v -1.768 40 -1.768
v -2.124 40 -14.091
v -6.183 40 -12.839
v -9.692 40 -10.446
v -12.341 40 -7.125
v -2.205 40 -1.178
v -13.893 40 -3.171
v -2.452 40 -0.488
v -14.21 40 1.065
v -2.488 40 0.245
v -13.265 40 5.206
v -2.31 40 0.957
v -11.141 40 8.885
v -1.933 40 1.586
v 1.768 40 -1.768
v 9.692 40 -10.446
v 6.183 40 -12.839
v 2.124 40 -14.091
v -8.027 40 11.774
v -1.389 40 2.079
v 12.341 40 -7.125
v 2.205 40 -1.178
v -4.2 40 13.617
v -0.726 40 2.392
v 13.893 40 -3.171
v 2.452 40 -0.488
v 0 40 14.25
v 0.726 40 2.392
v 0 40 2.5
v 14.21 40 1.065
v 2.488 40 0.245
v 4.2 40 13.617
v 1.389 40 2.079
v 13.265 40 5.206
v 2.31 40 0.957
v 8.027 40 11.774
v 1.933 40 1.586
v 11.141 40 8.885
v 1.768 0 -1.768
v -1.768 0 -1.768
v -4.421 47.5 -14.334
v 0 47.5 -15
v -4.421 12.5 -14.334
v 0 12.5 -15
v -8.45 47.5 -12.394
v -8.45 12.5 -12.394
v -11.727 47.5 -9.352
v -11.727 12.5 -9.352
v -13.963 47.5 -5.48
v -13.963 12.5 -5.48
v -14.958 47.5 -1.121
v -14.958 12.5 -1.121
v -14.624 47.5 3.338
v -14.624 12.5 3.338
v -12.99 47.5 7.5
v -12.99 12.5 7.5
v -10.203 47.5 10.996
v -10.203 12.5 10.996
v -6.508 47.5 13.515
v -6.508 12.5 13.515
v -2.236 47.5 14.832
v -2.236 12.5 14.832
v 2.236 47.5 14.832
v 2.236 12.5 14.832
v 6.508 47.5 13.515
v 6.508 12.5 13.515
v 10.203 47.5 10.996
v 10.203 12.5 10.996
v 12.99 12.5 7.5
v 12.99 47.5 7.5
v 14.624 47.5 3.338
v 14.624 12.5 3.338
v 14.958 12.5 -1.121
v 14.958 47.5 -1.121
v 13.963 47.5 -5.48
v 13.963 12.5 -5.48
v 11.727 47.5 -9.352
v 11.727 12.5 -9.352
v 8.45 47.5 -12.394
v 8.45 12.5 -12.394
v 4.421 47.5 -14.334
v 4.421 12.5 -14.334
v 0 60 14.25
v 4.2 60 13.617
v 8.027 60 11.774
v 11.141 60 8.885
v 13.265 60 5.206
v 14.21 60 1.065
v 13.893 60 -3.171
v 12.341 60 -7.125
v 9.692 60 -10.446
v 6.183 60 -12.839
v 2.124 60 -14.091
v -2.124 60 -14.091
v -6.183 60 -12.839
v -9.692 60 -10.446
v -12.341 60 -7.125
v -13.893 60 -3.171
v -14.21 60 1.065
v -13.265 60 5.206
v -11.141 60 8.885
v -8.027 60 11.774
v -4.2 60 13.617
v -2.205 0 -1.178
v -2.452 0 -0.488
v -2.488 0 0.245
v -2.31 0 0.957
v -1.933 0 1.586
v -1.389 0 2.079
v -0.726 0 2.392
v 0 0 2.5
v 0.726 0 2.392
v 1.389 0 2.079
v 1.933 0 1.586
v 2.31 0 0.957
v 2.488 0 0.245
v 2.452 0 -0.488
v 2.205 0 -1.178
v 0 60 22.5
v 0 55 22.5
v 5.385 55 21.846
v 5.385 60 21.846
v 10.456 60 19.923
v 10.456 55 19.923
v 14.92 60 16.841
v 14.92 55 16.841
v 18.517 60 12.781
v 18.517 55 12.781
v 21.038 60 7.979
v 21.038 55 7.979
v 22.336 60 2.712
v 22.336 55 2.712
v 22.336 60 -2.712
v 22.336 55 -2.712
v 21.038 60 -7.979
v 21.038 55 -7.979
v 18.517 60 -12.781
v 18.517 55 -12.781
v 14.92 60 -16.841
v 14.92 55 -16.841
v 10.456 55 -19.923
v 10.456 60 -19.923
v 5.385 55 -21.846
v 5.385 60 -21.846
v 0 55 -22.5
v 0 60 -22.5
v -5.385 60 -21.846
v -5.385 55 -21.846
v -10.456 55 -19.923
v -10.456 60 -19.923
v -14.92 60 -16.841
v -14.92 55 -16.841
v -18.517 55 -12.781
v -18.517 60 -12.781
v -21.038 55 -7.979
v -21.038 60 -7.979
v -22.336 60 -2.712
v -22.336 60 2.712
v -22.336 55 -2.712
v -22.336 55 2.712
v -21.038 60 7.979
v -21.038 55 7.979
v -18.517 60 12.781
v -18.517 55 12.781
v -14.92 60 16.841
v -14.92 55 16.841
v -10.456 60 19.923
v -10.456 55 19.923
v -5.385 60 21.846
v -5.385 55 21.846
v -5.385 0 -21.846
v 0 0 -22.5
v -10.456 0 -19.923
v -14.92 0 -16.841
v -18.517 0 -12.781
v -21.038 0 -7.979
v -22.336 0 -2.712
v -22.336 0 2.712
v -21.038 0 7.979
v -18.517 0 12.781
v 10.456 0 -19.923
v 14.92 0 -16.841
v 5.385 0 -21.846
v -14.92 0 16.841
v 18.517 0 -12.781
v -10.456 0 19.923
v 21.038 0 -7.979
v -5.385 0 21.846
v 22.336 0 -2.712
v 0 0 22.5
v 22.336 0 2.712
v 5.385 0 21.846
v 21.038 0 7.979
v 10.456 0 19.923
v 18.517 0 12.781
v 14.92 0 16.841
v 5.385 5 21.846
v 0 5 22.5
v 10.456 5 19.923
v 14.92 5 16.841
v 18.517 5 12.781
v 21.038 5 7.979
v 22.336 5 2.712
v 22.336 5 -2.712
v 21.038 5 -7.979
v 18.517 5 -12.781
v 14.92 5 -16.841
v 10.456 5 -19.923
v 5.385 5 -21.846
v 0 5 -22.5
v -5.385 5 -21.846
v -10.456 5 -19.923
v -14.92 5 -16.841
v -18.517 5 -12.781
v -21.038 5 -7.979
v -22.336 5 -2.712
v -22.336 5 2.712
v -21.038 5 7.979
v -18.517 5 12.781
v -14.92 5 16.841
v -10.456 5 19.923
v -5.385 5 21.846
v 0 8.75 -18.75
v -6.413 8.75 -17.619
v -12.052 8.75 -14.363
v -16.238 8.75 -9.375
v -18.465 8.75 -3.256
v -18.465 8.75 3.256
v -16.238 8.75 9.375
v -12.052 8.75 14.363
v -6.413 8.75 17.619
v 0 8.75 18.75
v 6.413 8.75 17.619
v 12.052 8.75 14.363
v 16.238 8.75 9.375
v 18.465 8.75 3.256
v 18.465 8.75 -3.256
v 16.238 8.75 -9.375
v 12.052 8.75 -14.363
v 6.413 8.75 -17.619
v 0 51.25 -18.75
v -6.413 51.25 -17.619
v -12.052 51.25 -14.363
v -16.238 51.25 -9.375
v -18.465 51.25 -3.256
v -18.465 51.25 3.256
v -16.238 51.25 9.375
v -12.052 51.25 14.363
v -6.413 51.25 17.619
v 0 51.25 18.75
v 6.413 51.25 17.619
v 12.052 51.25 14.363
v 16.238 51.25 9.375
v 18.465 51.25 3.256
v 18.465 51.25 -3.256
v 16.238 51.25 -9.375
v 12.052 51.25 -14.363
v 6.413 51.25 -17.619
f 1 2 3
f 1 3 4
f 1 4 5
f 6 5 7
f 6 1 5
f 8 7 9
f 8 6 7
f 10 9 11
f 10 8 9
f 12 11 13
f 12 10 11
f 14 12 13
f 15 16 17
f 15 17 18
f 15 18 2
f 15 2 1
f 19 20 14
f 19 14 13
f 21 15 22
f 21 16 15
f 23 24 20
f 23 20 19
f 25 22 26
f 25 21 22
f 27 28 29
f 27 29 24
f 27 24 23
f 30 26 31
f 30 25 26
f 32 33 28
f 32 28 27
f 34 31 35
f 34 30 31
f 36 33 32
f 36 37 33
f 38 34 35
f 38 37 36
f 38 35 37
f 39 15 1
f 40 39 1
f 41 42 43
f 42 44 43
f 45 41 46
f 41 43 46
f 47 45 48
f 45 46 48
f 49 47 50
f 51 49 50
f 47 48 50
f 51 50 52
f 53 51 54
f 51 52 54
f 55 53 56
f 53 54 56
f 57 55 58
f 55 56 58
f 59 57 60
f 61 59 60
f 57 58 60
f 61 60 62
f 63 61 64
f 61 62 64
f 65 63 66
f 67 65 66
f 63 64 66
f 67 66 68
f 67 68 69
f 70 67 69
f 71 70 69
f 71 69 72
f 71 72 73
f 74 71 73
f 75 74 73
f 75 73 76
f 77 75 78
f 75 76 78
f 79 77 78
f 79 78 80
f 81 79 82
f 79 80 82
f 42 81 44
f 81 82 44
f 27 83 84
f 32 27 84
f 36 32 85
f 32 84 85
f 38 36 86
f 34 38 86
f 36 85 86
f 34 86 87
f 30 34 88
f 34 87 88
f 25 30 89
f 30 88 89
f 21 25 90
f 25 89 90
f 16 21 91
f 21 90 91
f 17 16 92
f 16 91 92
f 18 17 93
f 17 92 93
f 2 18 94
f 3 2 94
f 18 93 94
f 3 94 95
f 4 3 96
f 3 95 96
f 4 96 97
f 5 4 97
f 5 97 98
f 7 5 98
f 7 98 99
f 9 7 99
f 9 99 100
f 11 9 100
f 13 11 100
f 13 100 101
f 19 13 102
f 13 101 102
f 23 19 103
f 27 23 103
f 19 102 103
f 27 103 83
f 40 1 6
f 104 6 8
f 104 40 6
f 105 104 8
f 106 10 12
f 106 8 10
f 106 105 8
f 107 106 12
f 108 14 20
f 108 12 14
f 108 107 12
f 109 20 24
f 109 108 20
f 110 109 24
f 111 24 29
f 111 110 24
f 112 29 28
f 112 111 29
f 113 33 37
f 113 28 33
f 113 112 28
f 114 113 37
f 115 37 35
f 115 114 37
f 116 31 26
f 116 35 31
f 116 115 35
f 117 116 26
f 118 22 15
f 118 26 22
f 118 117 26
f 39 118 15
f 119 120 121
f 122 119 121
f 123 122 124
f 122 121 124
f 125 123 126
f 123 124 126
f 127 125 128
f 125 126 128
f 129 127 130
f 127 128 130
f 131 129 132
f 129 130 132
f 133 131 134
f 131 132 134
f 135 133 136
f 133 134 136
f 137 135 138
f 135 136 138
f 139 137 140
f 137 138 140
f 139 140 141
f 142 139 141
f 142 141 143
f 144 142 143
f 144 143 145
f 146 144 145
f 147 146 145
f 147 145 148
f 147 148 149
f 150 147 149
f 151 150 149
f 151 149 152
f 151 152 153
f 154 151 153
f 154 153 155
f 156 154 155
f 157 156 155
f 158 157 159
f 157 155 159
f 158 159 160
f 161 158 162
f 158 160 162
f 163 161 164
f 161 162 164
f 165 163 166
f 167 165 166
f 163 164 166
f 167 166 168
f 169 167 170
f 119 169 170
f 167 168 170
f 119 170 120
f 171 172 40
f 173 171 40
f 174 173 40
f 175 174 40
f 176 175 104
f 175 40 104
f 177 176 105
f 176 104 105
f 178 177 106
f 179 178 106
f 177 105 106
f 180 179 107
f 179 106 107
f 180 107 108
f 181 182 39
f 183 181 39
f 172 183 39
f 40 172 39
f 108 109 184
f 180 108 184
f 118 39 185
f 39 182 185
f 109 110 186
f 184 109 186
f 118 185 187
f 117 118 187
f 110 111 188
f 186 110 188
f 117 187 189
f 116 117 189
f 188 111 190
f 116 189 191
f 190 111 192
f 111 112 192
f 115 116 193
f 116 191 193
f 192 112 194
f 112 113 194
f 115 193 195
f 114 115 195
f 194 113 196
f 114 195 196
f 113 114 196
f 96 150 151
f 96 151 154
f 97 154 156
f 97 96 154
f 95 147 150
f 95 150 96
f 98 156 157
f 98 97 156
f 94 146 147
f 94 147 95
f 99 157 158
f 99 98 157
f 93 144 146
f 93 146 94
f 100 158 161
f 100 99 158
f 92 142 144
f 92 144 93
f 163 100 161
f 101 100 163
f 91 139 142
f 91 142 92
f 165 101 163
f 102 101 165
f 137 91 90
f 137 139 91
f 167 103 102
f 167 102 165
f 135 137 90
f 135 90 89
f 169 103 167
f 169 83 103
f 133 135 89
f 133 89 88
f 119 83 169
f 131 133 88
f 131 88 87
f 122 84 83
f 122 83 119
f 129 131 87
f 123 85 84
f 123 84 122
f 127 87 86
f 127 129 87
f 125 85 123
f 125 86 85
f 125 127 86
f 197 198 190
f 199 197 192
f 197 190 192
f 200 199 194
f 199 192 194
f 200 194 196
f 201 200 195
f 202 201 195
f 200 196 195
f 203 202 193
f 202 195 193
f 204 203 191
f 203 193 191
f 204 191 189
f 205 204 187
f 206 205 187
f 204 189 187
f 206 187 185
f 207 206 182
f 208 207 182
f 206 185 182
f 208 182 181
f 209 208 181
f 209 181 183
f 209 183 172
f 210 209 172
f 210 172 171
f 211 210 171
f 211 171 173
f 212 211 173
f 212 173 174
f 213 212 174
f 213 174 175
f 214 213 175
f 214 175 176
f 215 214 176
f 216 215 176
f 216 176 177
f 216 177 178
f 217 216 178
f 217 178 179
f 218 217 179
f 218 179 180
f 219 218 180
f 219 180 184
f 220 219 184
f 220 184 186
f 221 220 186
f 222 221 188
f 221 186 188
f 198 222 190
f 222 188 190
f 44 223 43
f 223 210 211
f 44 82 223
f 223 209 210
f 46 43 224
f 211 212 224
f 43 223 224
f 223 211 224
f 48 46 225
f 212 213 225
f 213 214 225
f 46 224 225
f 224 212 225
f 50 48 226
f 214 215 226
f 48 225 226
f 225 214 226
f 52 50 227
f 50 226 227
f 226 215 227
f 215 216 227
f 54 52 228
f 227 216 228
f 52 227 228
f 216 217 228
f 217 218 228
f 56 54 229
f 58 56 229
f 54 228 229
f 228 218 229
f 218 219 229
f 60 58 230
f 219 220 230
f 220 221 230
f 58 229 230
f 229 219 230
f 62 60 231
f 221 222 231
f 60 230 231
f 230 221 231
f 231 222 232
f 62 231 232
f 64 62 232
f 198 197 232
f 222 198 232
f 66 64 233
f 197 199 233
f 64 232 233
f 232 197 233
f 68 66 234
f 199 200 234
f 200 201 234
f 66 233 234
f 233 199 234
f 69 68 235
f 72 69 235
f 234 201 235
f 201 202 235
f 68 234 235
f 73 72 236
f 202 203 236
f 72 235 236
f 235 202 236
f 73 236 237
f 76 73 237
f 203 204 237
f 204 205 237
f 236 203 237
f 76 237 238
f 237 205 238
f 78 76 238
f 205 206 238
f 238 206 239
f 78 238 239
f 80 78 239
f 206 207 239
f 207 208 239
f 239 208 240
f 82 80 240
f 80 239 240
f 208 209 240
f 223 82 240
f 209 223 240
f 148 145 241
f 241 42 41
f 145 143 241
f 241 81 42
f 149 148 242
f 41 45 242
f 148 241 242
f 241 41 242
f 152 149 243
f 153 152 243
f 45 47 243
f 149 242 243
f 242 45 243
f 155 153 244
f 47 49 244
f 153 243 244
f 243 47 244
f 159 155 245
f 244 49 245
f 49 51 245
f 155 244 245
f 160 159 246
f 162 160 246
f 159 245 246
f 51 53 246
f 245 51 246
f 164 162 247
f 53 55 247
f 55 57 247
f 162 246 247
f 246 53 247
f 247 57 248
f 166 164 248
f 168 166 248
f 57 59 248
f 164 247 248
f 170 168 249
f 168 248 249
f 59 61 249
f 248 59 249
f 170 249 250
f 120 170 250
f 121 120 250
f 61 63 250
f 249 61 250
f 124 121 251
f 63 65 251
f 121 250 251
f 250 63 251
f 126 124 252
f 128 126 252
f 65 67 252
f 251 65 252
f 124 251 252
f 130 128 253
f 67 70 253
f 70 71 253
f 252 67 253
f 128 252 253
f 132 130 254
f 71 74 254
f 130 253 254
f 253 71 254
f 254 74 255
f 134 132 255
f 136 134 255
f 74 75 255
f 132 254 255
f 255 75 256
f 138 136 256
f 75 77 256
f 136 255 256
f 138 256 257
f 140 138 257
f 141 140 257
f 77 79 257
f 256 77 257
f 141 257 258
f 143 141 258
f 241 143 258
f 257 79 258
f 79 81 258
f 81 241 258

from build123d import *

# Parameters (mm, degrees)
SKETCH1_R           = 22.5
BOSS_EXTRUDE1_DEPTH = 60
SKETCH2_R           = 14.25
CUT_EXTRUDE1_DEPTH  = 20


with BuildPart() as part:
    # Sketch1 → Boss-Extrude1 (new body)
    with BuildSketch(Plane(origin=(0, 0, 0), x_dir=(1, 0, 0), z_dir=(0, 1, 0))):
        with Locations(Location((0, 0, 0), (0, 0, 270))):
            Circle(SKETCH1_R)
        with BuildLine():
            Line((1.767766953, 1.767766953), (-1.767766953, 1.767766953))
            ThreePointArc((-1.767766953, 1.767766953), (0, -2.5), (1.767766953, 1.767766953))
        make_face(mode=Mode.SUBTRACT)
    extrude(amount=BOSS_EXTRUDE1_DEPTH)

    # Sketch2 → Cut-Extrude1 (cut)
    with BuildSketch(Plane(origin=(0, 60, 0), x_dir=(1, 0, 0), z_dir=(0, 1, 0))):
        with Locations(Location((0, 0, 0), (0, 0, 270))):
            Circle(SKETCH2_R)
    extrude(amount=-CUT_EXTRUDE1_DEPTH, mode=Mode.SUBTRACT)

    # Sketch4 → Cut-Revolve3 (revolve, cut)
    with BuildSketch(Plane.XY, mode=Mode.PRIVATE) as cut_revolve3_sk:
        Polygon((22.5, 5), (22.5, 55), (15, 47.5), (15, 12.5), align=None)
    revolve(cut_revolve3_sk.sketch.rotate(Axis((0, -24.387590134, 0), (0, 1, 0)), 90), axis=Axis((0, -24.387590134, 0), (0, 1, 0)), mode=Mode.SUBTRACT)


solid = part.part
